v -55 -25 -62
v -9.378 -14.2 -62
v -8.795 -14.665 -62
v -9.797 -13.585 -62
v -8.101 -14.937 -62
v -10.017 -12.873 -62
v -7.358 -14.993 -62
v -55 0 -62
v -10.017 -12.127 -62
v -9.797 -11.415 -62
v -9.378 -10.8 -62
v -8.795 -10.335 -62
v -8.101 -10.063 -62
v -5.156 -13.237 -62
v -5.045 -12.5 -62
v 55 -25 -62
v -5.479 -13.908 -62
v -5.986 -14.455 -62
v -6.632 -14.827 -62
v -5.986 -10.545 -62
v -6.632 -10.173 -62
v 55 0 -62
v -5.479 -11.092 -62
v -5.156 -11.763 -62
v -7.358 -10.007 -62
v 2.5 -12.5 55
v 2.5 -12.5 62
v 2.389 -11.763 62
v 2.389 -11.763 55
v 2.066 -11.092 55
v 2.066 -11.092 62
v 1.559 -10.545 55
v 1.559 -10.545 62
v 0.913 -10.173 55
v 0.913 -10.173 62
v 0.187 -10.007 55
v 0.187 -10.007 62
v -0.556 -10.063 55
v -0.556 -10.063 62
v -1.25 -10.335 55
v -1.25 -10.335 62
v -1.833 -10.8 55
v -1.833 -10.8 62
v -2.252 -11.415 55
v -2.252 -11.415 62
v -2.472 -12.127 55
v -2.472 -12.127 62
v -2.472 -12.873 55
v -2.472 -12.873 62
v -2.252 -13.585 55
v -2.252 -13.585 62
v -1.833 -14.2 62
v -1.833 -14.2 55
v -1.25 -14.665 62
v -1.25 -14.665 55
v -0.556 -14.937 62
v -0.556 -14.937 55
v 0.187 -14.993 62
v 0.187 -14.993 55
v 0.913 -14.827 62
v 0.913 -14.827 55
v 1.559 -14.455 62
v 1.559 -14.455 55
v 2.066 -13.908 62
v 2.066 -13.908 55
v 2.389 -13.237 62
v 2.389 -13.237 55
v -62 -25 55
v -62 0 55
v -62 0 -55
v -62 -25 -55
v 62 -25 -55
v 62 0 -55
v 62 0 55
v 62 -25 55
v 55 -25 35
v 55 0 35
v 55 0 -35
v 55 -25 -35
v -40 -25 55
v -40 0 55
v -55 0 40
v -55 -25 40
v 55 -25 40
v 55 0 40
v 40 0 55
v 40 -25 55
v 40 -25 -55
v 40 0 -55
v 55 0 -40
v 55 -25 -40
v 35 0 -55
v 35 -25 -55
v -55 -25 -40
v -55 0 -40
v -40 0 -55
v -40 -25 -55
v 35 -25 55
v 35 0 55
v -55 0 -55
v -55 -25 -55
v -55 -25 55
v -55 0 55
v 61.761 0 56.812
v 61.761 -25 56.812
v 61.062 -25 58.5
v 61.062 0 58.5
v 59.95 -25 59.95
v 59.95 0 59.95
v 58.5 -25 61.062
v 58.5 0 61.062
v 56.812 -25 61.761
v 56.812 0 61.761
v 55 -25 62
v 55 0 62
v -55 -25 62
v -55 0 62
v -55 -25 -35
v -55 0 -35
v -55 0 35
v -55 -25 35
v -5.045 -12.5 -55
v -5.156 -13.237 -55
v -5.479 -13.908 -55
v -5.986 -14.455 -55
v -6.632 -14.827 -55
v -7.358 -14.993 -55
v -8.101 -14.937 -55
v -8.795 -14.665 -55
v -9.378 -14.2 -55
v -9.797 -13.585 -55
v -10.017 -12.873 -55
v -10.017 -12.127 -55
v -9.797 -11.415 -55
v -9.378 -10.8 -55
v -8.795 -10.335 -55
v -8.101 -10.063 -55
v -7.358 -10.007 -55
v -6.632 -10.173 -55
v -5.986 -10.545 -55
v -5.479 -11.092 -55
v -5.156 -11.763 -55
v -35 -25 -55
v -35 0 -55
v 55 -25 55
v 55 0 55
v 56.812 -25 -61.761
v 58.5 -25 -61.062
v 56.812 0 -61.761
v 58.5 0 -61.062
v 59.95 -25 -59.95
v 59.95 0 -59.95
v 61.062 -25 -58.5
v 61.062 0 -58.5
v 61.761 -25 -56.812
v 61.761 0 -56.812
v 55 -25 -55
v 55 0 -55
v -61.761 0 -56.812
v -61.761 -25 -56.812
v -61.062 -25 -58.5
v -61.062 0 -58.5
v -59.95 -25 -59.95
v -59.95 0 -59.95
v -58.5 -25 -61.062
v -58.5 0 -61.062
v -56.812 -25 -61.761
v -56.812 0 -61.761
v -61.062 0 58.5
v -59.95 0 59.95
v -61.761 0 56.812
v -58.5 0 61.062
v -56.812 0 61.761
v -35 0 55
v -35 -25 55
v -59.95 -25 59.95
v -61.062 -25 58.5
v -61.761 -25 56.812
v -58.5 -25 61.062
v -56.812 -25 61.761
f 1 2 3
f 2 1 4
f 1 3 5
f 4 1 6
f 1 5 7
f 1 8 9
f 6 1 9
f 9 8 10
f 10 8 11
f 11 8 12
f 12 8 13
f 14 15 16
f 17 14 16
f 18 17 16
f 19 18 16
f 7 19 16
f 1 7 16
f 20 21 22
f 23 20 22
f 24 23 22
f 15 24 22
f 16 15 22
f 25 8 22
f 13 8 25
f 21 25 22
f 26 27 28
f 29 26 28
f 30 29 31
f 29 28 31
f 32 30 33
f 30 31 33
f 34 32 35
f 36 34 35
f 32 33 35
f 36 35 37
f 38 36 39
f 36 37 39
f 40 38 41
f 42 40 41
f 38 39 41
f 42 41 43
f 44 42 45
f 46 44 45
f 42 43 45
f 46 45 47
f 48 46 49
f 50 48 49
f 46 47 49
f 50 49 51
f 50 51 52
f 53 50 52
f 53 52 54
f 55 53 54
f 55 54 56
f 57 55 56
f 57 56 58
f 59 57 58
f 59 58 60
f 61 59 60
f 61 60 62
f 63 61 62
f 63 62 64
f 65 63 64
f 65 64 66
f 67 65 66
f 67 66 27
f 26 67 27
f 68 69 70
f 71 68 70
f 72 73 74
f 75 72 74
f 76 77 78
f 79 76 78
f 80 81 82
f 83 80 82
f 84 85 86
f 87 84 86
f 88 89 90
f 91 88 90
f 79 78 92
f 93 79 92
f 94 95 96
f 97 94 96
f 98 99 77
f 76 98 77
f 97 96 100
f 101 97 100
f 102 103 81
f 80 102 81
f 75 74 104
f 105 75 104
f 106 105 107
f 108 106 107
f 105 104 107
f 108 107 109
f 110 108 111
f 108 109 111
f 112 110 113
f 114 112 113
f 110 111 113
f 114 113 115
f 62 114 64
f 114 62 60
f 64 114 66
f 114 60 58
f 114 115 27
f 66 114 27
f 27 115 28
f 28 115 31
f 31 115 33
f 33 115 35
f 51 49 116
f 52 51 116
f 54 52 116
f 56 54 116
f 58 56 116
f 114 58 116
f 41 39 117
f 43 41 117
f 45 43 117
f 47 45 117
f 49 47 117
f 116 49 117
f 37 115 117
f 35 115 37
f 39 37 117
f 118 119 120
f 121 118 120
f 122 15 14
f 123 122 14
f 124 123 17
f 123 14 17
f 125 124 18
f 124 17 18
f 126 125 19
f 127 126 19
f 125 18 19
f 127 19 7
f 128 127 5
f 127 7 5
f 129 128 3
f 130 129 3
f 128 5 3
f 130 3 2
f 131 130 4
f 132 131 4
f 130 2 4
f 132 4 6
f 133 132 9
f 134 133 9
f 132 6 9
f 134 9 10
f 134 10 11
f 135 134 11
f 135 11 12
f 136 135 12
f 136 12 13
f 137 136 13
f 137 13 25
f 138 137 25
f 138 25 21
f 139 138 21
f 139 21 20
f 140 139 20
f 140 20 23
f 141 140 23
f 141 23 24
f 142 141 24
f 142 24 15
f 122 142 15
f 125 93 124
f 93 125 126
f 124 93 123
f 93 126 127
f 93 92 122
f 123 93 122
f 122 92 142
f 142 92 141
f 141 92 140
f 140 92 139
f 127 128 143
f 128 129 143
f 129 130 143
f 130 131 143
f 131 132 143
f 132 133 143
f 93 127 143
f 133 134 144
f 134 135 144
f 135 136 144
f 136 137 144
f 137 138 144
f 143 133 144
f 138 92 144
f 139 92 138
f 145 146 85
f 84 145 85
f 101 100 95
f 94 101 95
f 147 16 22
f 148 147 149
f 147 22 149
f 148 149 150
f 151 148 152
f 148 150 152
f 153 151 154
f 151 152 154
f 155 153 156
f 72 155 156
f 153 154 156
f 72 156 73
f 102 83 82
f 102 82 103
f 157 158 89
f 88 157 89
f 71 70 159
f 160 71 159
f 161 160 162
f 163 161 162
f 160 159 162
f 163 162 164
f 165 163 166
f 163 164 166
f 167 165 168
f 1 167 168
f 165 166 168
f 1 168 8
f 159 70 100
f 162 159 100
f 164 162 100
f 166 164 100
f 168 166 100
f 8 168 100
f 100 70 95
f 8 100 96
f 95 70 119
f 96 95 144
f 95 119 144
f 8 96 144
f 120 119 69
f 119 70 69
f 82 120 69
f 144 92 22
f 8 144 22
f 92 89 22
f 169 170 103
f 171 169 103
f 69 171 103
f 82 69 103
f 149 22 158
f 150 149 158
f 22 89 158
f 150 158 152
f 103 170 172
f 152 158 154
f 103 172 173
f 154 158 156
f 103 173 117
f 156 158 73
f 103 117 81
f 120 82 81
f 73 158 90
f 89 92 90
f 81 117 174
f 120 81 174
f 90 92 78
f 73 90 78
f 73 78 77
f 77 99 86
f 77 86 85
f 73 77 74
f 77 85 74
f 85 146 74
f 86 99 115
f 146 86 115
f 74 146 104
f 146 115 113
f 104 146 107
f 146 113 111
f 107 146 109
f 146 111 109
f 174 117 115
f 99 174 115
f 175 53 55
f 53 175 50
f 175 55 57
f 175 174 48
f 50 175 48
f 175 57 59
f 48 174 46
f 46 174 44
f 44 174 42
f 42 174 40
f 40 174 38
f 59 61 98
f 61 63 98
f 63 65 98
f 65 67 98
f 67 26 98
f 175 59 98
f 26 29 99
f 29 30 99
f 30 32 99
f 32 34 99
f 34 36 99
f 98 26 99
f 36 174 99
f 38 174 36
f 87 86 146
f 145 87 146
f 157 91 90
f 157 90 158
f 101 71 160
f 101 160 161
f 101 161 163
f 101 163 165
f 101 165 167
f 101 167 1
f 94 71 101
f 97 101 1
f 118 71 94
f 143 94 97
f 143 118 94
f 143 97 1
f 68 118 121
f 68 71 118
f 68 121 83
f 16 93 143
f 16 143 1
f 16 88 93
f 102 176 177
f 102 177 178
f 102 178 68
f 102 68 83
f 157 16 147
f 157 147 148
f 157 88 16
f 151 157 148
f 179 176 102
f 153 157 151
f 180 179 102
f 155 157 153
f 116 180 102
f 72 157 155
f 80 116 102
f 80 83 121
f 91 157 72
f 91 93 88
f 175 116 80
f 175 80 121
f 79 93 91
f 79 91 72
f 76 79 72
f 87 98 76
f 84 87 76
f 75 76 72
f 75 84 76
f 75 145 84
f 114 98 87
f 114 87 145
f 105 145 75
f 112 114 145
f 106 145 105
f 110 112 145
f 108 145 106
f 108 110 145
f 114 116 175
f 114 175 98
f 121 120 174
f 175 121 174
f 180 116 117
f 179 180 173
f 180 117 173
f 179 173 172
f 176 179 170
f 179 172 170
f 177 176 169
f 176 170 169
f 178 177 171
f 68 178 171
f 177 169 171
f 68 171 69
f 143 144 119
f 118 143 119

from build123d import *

# Parameters (mm, degrees)
F1_DEPTH = 25
F3_R     = 2.5
F4_DEPTH = 25
F2_R     = 2.5
F5_DEPTH = 25


# Not quite as in the source:
# - ends of sketch curves that miss each other by under 0.0002 mm in the source are joined


with BuildPart() as f1:
    # F0 (on Front) → F1 (new body)
    with BuildSketch(Plane.XZ):
        with BuildLine():
            Line((40, 55), (55, 55))
            Line((55, 55), (55, 62.0000141774))
            Line((55, 62.0000141774), (-55, 62.0000141774))
            ThreePointArc((-55, 62.0000141774), (-59.9497599972, 59.9497599972), (-62.0000177185, 55))
            Line((-62.0000177185, 55), (-62.0000141774, -55))
            ThreePointArc((-62.0000141774, -55), (-59.9497574932, -59.9497574932), (-55, -62.0000141774))
            Line((-55, -62.0000141774), (-55, -55))
            Line((-55, -55), (-55, -40))
            Line((-55, -40), (-55, -35))
            Line((-55, -35), (-55, 35))
            Line((-55, 35), (-55, 40))
            Line((-55, 40), (-55, 55))
            Line((-55, 55), (-40, 55))
            Line((-40, 55), (-35, 55))
            Line((-35, 55), (35, 55))
            Line((35, 55), (40, 55))
        make_face()
        with BuildLine():
            Line((55, 62.0000141774), (55, 55))
            Line((55, 55), (55, 40))
            Line((55, 40), (55, 35))
            Line((55, 35), (55, -35))
            Line((55, -35), (55, -40))
            Line((55, -40), (55, -55))
            Line((55, -55), (40, -55))
            Line((40, -55), (35, -55))
            Line((35, -55), (-35, -55))
            Line((-35, -55), (-40, -55))
            Line((-40, -55), (-55, -55))
            Line((-55, -55), (-55, -62.0000141774))
            Line((-55, -62.0000141774), (55, -62.0000141774))
            ThreePointArc((55, -62.0000141774), (59.9497599972, -59.9497599972), (62.0000177185, -55))
            Line((62.0000177185, -55), (62.0000141774, 55))
            ThreePointArc((62.0000141774, 55), (59.9497574932, 59.9497574932), (55, 62.0000141774))
        make_face()
        Polygon((-55, 35), (-35, 55), (-40, 55), (-55, 40), align=None)
        Polygon((55, 40), (40, 55), (35, 55), (55, 35), align=None)
        Polygon((55, -40), (55, -35), (35, -55), (40, -55), align=None)
        Polygon((-35, -55), (-55, -35), (-55, -40), (-40, -55), align=None)
    extrude(amount=F1_DEPTH)

    # F3 (on face) → F4 (cut)
    with BuildSketch(Plane(origin=(0, 0, -62.0000141774), x_dir=(1, 0, 0), z_dir=(0, 0, -1))):
        with Locations((-7.5450468063, 12.5)):
            Circle(F3_R)
    extrude(amount=-F4_DEPTH, mode=Mode.SUBTRACT)

    # F2 (on face) → F5 (cut)
    with BuildSketch(Plane.XY.offset(62.0000141774)):
        with Locations((0, -12.5)):
            Circle(F2_R)
    extrude(amount=-F5_DEPTH, mode=Mode.SUBTRACT)


solid = f1.part
